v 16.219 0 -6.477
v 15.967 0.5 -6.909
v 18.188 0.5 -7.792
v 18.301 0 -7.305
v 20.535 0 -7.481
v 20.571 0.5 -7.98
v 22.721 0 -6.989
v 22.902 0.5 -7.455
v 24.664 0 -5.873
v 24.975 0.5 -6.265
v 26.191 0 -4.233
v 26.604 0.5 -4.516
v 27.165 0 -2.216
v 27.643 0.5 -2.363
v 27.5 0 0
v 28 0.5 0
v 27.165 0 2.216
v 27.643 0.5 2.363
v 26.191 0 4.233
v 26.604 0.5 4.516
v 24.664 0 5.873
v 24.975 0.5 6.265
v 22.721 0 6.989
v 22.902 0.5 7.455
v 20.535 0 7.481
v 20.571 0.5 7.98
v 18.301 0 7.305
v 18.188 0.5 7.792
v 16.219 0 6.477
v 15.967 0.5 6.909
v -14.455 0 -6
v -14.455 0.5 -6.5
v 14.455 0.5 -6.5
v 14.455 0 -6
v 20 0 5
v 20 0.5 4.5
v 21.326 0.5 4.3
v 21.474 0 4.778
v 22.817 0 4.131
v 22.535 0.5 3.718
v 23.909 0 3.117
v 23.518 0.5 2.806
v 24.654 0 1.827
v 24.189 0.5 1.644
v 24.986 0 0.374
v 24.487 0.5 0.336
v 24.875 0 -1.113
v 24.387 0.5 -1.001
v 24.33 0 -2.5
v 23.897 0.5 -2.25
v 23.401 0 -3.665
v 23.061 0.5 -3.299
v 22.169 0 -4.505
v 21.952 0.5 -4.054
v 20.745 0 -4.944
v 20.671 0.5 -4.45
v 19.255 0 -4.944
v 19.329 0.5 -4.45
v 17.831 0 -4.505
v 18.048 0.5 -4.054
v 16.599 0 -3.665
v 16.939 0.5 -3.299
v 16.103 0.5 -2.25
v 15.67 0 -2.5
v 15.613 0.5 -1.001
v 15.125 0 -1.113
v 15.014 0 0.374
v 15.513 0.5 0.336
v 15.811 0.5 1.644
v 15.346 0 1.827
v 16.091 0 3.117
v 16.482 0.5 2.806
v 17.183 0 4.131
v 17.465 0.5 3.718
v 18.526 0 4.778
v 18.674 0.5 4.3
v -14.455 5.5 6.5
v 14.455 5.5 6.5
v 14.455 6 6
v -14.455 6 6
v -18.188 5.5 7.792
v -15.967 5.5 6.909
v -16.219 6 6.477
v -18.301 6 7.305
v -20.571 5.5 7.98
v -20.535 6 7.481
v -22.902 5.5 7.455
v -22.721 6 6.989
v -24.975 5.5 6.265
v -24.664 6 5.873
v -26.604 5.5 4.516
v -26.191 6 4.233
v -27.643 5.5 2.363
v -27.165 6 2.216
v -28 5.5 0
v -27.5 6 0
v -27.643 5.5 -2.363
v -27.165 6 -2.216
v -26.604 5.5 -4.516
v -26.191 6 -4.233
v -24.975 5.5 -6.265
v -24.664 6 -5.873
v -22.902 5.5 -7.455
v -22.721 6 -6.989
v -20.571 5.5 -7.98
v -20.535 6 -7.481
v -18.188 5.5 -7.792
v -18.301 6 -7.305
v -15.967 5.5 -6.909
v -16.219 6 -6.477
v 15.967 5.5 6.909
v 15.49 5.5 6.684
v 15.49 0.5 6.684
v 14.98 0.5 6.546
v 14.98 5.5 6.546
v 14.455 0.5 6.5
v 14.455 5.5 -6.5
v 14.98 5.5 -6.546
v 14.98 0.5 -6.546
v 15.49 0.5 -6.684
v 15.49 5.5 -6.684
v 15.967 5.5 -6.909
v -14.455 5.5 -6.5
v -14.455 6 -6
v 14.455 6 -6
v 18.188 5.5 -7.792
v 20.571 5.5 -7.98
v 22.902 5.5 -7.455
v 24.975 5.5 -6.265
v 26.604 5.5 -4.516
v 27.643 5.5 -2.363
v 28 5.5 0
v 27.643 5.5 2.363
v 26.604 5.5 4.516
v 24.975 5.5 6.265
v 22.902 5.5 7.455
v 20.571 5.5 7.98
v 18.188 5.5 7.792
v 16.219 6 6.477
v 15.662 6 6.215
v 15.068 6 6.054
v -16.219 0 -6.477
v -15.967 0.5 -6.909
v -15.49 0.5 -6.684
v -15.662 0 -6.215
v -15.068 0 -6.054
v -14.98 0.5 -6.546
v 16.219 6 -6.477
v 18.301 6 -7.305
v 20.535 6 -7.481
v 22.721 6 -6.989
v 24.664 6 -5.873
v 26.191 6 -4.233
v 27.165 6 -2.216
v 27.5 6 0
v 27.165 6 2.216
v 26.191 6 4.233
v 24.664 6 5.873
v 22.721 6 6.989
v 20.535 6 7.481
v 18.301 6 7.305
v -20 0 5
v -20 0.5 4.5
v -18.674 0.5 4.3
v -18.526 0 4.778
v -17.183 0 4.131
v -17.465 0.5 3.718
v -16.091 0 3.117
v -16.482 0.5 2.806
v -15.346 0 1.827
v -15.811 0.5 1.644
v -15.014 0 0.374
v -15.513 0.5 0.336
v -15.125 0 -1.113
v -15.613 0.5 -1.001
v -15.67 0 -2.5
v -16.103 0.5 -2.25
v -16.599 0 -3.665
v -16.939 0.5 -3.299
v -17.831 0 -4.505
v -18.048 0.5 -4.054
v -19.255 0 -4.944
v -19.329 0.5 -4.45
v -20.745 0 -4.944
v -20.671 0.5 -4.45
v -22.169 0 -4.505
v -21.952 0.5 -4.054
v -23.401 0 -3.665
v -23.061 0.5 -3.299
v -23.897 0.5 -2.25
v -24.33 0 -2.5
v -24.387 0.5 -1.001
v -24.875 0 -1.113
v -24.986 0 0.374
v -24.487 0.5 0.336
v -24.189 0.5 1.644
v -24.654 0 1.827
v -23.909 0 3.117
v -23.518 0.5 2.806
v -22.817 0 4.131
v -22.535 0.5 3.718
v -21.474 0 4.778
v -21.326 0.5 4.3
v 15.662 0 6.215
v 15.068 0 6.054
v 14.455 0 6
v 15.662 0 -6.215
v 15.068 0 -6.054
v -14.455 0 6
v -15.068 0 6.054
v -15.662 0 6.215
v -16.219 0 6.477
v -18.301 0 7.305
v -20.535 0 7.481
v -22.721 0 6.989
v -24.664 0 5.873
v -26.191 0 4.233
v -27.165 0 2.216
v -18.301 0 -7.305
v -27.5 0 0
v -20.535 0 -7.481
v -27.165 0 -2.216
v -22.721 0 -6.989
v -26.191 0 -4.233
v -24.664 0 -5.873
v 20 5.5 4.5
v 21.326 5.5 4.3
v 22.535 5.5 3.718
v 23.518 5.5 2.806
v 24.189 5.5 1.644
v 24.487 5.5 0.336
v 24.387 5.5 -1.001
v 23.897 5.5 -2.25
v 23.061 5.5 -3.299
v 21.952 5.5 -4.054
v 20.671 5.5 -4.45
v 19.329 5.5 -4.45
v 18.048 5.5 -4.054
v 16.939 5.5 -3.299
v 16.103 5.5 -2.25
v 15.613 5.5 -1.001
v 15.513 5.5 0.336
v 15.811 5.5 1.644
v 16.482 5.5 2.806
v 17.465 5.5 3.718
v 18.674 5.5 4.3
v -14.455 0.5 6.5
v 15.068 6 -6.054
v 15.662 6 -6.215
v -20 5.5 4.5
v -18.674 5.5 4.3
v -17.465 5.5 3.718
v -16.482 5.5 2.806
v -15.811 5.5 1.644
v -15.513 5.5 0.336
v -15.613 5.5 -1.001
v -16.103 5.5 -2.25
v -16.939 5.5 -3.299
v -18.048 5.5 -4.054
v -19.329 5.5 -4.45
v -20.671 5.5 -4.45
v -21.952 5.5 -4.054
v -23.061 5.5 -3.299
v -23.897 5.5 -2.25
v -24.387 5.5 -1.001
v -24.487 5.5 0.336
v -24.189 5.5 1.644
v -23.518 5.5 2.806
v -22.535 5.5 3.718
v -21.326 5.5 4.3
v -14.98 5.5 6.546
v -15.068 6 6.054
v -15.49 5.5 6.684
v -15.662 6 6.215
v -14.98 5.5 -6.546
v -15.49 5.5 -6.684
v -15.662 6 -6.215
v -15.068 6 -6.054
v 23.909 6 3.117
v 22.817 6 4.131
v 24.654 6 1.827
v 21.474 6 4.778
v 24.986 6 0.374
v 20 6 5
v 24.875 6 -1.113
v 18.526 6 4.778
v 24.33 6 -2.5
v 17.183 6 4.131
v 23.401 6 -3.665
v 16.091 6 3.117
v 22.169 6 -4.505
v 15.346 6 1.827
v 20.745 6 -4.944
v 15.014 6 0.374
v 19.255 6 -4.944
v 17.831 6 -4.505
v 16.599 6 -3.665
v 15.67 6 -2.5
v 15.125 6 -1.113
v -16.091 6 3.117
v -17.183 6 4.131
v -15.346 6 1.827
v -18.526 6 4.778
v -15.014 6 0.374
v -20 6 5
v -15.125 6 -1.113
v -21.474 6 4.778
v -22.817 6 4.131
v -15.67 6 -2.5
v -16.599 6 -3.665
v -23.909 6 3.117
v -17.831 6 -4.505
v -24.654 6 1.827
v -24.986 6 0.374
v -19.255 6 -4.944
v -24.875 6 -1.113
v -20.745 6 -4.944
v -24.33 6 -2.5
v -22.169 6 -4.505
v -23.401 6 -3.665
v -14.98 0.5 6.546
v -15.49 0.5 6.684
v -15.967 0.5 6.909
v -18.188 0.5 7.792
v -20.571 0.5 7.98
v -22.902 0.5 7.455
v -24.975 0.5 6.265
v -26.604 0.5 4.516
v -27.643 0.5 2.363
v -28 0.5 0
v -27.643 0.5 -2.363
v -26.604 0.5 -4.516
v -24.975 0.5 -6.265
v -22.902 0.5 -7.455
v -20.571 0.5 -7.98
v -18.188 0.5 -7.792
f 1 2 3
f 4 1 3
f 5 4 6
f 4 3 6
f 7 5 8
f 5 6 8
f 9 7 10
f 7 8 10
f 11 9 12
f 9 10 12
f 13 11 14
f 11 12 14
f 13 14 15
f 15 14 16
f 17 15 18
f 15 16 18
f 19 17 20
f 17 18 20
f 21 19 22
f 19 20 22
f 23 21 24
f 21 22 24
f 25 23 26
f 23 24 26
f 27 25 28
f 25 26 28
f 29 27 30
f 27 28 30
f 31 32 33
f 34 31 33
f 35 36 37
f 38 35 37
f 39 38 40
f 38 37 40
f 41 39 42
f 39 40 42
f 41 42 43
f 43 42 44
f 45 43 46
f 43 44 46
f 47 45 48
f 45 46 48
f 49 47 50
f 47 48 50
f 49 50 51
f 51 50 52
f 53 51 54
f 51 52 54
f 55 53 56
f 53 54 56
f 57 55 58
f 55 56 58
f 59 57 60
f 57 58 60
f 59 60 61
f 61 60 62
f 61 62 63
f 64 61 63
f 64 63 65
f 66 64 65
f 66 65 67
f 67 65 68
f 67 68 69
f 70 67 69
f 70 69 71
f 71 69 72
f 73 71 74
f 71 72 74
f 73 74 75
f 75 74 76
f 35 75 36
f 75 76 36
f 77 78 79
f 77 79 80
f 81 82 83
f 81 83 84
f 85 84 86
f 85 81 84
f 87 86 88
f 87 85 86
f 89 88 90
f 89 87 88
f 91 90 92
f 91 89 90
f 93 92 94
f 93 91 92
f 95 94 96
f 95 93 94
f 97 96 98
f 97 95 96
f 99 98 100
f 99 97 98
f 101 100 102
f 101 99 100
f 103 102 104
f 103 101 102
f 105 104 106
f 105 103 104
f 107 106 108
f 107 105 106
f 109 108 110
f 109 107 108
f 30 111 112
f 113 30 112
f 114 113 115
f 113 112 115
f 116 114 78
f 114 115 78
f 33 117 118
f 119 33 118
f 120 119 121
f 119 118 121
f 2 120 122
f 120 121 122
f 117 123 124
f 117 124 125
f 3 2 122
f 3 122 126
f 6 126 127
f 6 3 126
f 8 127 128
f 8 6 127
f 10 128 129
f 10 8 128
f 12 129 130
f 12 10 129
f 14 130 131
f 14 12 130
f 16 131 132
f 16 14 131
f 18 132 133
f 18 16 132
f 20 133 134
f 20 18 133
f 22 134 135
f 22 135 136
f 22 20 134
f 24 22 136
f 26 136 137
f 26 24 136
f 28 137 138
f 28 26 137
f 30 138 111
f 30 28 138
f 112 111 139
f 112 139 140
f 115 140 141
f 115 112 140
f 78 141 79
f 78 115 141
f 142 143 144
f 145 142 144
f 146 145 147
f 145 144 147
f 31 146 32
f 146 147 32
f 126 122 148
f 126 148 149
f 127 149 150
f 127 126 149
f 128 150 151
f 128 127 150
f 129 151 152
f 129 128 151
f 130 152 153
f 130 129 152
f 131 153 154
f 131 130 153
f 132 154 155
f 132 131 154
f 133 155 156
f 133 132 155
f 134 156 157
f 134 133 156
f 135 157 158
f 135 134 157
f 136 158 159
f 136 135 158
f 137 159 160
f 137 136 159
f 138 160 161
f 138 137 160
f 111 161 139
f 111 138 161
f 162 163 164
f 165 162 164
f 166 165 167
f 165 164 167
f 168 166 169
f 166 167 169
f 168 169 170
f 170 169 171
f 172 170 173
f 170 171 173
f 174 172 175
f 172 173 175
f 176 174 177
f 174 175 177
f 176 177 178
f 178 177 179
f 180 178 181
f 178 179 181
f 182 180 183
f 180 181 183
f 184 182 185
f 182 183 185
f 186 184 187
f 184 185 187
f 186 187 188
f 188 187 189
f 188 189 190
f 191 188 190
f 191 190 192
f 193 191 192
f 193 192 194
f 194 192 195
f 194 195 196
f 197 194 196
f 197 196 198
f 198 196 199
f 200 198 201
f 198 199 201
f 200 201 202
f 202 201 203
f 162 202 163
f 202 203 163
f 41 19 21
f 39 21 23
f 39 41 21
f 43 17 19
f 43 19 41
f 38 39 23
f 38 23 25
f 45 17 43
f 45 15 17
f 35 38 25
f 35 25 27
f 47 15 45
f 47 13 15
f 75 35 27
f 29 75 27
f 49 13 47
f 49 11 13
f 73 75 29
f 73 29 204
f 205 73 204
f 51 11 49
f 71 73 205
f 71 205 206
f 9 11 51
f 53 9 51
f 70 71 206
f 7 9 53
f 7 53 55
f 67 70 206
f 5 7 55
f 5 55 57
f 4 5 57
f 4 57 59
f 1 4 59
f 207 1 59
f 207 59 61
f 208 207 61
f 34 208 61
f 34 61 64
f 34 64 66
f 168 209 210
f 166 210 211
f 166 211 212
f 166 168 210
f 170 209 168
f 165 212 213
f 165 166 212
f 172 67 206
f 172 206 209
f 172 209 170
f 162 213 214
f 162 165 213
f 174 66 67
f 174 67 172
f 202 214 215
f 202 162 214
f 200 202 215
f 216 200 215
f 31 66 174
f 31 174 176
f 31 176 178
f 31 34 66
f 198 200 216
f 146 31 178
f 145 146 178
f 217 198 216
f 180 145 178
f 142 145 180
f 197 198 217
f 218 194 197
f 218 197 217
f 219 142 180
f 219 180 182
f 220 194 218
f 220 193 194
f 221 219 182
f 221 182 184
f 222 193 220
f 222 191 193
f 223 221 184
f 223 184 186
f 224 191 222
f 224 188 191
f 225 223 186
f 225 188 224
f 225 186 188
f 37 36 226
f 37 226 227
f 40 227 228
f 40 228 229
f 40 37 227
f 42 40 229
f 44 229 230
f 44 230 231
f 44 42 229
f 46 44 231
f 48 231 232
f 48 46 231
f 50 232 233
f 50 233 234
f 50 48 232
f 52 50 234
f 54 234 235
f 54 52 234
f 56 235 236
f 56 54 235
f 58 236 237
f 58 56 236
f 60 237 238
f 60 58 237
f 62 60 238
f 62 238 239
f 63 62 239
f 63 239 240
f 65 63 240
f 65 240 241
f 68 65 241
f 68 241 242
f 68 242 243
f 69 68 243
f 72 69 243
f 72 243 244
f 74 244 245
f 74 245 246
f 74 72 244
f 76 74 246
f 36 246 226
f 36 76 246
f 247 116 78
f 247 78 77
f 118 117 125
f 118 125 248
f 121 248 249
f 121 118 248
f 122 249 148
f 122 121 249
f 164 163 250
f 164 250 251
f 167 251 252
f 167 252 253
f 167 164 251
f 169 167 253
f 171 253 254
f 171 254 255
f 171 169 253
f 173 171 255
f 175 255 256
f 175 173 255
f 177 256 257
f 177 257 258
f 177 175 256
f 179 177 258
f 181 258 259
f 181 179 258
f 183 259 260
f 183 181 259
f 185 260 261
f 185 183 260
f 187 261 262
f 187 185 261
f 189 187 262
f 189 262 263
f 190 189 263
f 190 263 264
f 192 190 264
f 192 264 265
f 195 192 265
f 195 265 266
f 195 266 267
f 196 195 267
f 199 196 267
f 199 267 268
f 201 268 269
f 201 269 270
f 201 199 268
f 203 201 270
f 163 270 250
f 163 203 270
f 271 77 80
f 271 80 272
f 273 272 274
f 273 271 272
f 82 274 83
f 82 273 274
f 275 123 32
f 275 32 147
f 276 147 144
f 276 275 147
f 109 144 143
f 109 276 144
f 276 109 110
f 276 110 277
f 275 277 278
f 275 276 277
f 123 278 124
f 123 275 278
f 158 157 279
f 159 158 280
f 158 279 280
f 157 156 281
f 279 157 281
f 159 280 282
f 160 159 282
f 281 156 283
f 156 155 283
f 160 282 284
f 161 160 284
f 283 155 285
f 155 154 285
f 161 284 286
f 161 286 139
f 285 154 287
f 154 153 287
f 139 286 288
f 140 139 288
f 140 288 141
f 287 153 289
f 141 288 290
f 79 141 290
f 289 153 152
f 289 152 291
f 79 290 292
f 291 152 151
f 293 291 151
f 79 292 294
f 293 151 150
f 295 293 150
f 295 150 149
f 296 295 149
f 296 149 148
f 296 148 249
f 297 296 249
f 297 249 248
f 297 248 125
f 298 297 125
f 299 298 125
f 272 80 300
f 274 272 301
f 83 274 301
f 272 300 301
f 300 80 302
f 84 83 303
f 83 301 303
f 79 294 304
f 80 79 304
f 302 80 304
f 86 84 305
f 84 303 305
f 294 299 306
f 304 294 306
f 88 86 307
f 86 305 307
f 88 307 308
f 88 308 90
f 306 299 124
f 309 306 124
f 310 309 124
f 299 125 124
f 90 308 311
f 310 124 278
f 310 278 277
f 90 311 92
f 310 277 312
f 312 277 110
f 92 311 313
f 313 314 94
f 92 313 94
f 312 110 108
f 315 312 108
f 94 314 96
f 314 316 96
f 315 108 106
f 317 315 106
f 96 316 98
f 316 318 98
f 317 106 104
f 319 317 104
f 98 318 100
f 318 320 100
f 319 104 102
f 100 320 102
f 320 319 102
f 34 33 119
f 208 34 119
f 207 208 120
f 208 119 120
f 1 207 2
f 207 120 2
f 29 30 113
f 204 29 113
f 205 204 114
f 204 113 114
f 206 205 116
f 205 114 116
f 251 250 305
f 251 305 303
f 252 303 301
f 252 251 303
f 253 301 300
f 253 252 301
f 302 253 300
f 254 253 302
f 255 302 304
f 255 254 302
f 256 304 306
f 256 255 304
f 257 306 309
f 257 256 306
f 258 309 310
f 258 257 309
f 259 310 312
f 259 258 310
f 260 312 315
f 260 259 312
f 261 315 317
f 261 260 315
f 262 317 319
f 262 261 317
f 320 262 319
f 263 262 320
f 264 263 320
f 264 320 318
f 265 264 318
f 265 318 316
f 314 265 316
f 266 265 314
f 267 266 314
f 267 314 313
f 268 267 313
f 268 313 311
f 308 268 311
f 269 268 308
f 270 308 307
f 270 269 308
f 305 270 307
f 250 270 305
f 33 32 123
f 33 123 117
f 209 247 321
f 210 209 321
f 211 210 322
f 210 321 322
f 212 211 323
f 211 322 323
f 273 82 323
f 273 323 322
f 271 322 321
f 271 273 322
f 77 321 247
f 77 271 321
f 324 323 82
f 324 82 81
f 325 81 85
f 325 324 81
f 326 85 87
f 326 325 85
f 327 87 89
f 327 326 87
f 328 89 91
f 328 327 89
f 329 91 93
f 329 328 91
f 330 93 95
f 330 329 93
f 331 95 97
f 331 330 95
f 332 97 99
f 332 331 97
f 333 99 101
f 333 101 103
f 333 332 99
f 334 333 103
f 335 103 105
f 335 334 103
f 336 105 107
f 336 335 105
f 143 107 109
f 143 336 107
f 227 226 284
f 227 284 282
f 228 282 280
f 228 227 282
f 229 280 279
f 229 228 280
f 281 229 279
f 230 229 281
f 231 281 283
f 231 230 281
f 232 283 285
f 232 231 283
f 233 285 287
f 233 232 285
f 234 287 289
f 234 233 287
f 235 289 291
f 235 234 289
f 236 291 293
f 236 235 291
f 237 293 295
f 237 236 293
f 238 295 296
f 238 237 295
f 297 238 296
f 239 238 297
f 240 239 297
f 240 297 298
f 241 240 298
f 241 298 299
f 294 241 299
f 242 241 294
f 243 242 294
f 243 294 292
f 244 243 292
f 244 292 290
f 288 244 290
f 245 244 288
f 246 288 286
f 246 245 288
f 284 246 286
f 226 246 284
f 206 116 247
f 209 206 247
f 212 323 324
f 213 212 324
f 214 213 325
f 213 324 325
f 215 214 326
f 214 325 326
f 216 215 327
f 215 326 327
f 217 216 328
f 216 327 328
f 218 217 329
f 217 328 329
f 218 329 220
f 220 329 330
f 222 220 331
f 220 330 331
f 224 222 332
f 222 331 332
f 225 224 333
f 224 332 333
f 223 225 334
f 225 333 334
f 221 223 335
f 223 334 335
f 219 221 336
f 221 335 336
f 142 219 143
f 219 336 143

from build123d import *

# Parameters (mm, degrees)
SKETCH_1_R      = 4.5
EXTRUDE_1_DEPTH = 6
FILLET_1_R      = 3
CHAMFER_1_SIZE  = 0.5


with BuildPart() as part:
    # 草图1 → 凸台-拉伸1 (new body)
    with BuildSketch(Plane(origin=(0, 0, 0), x_dir=(1, 0, 0), z_dir=(0, 1, 0))):
        with BuildLine():
            Line((-15.336310473, 6.5), (15.336310473, 6.5))
            ThreePointArc((15.336310473, 6.5), (28, 0), (15.336310473, -6.5))
            Line((15.336310473, -6.5), (-15.336310473, -6.5))
            ThreePointArc((-15.336310473, -6.5), (-28, 0), (-15.336310473, 6.5))
        make_face()
        with Locations(Location((-20, 0, 0), (0, 0, 270))):
            Circle(SKETCH_1_R, mode=Mode.SUBTRACT)
        with Locations(Location((20, 0, 0), (0, 0, 270))):
            Circle(SKETCH_1_R, mode=Mode.SUBTRACT)
    extrude(amount=EXTRUDE_1_DEPTH)

    # 圆角1
    fillet_1_edges = [part.edges().sort_by_distance(p)[0] for p in [
        (-15.336310473, 3, -6.5),
        (15.336310473, 3, -6.5),
        (15.336310473, 3, 6.5),
        (-15.336310473, 3, 6.5),
    ]]
    fillet(fillet_1_edges, radius=FILLET_1_R)

    # 倒角1
    chamfer_1_edges = [part.edges().sort_by_distance(p)[0] for p in [
        (-20, 0, -4.5),
        (-20, 6, -4.5),
        (20, 0, -4.5),
        (20, 6, -4.5),
        (-28, 0, 0),
        (-28, 6, 0),
        (0, 0, -6.5),
        (0, 6, -6.5),
        (28, 0, 0),
        (28, 6, 0),
        (0, 0, 6.5),
        (0, 6, 6.5),
        (-15.238081199, 0, -6.604078103),
        (-15.238081199, 6, -6.604078103),
        (15.238081199, 0, -6.604078103),
        (15.238081199, 6, -6.604078103),
        (15.238081199, 0, 6.604078103),
        (15.238081199, 6, 6.604078103),
        (-15.238081199, 0, 6.604078103),
        (-15.238081199, 6, 6.604078103),
    ]]
    chamfer(chamfer_1_edges, length=CHAMFER_1_SIZE)


solid = part.part
